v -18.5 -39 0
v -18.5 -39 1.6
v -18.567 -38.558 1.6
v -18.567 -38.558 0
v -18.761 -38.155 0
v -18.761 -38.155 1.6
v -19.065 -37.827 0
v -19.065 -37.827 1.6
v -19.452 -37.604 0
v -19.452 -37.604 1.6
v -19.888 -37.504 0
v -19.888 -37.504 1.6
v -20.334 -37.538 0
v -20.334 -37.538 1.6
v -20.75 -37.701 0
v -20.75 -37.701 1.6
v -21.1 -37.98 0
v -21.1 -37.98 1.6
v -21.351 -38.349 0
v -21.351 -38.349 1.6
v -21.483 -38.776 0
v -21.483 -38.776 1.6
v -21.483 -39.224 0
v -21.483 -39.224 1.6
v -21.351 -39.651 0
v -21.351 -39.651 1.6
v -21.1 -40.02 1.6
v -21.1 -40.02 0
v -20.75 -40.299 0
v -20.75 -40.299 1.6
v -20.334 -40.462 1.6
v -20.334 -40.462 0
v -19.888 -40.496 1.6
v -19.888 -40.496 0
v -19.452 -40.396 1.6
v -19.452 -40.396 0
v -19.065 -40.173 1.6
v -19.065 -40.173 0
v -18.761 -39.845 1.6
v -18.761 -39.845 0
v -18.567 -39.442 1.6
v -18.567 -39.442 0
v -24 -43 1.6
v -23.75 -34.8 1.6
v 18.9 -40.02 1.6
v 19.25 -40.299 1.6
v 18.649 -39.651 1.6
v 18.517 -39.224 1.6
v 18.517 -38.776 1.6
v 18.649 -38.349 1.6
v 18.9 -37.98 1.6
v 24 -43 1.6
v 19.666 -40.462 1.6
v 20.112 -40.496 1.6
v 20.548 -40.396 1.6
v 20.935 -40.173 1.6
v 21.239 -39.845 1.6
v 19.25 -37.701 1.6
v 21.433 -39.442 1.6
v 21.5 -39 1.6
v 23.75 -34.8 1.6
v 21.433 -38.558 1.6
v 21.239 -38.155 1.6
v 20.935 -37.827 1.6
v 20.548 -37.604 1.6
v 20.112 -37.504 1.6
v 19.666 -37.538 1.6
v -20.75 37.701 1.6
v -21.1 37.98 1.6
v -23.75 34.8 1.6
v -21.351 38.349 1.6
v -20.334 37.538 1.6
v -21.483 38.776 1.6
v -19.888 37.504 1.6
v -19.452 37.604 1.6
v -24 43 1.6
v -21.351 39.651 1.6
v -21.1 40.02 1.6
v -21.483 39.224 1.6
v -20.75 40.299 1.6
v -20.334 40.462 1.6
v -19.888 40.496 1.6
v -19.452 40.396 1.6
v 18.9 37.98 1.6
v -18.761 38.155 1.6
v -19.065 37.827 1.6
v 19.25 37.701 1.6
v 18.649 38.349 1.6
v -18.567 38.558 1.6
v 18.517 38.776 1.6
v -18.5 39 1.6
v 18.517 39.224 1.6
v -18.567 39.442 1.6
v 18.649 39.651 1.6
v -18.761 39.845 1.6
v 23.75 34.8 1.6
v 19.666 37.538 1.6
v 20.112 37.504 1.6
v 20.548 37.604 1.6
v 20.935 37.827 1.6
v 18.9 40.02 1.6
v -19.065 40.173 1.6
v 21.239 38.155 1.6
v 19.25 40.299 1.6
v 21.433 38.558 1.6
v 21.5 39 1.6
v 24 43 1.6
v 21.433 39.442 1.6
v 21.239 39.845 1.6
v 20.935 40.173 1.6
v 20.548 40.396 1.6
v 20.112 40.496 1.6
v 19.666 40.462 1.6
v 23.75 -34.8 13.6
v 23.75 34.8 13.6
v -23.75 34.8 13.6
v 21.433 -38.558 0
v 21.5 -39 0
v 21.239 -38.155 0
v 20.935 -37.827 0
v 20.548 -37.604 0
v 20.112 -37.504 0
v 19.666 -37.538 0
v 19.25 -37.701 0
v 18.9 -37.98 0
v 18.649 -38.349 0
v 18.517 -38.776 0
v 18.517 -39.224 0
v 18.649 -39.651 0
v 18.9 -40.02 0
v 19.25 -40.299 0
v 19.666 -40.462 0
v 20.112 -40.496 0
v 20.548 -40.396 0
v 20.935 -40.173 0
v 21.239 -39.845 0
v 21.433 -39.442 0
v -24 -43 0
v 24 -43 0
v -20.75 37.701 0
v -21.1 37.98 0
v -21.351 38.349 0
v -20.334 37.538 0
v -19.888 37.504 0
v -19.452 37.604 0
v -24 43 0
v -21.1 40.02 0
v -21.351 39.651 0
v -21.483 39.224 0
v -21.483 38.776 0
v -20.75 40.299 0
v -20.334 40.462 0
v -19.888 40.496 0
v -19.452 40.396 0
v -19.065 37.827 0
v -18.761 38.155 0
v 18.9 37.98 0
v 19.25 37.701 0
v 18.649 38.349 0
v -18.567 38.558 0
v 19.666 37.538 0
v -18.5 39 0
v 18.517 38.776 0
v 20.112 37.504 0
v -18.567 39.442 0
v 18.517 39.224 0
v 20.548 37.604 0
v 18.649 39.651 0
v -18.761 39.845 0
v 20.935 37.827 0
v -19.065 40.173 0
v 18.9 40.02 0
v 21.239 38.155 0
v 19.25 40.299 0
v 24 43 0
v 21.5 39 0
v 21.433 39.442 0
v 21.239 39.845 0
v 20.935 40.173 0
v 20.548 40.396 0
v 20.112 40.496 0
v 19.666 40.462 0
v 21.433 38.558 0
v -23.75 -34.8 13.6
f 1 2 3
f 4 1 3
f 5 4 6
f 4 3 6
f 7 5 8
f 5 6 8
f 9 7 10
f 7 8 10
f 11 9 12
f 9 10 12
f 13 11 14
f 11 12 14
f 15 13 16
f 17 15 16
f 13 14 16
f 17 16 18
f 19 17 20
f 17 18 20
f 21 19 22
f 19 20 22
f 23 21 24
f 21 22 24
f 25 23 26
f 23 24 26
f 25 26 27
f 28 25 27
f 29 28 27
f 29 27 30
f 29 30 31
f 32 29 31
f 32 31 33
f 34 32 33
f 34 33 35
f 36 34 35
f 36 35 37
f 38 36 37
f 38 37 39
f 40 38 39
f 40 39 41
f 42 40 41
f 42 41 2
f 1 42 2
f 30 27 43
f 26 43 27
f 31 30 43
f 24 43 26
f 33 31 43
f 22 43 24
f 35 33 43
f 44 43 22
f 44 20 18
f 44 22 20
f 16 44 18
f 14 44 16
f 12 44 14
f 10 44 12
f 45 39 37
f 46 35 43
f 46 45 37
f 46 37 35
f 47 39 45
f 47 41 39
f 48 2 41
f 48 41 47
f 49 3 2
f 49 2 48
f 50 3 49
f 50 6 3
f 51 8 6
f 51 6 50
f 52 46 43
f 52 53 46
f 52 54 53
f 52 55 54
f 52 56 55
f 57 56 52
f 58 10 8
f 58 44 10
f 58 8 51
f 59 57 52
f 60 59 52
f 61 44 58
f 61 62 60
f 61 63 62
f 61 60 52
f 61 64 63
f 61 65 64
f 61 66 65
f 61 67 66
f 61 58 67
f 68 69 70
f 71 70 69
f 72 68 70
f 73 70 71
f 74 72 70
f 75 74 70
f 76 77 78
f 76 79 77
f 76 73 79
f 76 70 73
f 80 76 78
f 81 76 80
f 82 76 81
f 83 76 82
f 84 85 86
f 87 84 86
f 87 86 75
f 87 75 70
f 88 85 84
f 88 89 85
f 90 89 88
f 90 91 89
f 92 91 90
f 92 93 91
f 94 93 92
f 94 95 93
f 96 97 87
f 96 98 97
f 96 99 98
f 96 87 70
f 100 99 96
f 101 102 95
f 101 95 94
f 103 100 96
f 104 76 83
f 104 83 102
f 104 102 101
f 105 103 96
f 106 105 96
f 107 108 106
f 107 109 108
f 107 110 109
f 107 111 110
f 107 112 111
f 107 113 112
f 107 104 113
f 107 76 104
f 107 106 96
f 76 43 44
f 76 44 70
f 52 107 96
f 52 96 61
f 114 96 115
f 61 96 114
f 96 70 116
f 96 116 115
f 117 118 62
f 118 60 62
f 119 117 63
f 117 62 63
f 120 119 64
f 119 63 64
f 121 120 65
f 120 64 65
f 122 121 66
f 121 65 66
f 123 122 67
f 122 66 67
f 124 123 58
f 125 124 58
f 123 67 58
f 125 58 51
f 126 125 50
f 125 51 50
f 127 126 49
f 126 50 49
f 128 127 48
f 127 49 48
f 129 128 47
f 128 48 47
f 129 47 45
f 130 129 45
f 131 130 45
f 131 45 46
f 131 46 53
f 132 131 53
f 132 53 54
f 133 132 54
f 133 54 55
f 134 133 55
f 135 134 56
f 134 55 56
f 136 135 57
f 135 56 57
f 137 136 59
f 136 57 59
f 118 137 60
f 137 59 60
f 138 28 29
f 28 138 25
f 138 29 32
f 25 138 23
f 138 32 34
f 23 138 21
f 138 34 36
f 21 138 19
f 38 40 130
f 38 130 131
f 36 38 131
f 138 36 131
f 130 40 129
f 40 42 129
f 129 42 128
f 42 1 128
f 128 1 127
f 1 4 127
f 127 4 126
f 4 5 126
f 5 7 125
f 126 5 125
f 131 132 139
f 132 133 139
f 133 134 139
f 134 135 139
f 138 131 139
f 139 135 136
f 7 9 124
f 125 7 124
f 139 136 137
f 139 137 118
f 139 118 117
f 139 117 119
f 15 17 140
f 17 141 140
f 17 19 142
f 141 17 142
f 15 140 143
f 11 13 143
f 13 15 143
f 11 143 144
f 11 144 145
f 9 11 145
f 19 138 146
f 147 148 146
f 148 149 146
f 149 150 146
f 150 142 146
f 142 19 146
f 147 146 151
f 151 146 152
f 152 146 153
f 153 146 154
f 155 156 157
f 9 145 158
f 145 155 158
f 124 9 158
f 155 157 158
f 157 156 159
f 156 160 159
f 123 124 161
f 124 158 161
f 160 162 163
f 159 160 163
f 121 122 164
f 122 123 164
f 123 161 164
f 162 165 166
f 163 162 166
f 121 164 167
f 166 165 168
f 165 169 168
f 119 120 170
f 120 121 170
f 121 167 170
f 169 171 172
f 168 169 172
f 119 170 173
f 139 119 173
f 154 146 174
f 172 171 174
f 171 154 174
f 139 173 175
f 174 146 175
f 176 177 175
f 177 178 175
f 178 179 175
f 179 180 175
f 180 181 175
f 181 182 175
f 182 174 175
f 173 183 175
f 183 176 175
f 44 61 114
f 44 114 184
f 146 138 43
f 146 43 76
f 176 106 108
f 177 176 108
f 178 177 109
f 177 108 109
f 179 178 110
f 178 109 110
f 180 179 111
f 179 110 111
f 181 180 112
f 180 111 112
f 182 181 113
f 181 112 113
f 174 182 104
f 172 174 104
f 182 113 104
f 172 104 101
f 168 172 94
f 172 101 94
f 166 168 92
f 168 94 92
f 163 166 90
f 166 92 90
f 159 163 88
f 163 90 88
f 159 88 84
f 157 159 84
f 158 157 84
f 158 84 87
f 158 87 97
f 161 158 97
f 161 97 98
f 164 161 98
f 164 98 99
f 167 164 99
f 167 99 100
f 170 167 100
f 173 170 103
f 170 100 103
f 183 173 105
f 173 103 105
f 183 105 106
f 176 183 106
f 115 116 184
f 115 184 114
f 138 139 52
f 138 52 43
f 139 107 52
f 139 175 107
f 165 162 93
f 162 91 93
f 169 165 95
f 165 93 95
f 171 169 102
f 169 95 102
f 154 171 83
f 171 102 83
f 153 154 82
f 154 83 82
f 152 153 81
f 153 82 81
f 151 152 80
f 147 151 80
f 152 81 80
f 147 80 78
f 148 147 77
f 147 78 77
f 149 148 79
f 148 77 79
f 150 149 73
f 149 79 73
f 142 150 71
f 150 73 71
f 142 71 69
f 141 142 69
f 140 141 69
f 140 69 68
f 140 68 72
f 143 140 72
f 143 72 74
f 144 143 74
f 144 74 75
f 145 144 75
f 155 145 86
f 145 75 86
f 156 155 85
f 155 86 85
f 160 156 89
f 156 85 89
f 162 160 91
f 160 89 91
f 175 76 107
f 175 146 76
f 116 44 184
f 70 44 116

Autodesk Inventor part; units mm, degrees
ref_plane "YZ Plane" through (0, 0, 0) normal (1, 0, 0) x (0, 1, 0)
ref_plane "XZ Plane" through (0, 0, 0) normal (0, 1, 0) x (-1, 0, 0)
ref_plane "XY Plane" through (0, 0, 0) normal (0, 0, 1) x (1, 0, 0)
sketch "スケッチ1" plane through (0, 0, 0) normal (0, 0, 1) x (1, 0, 0)
  line L0 (-24, 43) -> (24, 43)
  line L1 (24, 43) -> (24, -43)
  line L2 (24, -43) -> (-24, -43)
  line L3 (-24, -43) -> (-24, 43)
  point P0 (0, 0)
  point P1 (0, 43)
  point P2 (24, 0)
  dimension "d0" = 48
  dimension "d1" = 86
extrude "押し出し1" add sketch "スケッチ1" along normal blind 1.6
sketch "スケッチ2" plane through (0, 0, 1.6) normal (0, 0, 1) x (1, 0, 0)
  line L0 (-23.75, 34.8) -> (23.75, 34.8)
  line L1 (23.75, 34.8) -> (23.75, -34.8)
  line L2 (23.75, -34.8) -> (-23.75, -34.8)
  line L3 (-23.75, -34.8) -> (-23.75, 34.8)
  point P0 (0, 0)
  point P1 (0, 34.8)
  point P2 (23.75, 0)
  dimension "d4" = 47.5
  dimension "d5" = 69.6
extrude "押し出し2" add sketch "スケッチ2" along normal blind 12
sketch "スケッチ3" plane through (0, 0, 1.6) normal (0, 0, 1) x (1, 0, 0)
  line L0 (-24, -43) -> (24, -43) projected
  line L1 (-24, 43) -> (-24, -43) projected
  line L2 (24, -43) -> (24, 43) projected
  line L3 (24, 43) -> (-24, 43) projected
  circle A0 centre (-20, -39) radius 1.5
  circle A1 centre (20, -39) radius 1.5
  circle A2 centre (-20, 39) radius 1.5
  circle A3 centre (20, 39) radius 1.5
  point P0 (0, 0)
  dimension "d8" = 4
  dimension "d9" = 4
  dimension "d10" = 4
  dimension "d11" = 4
  dimension "d12" = 3
extrude "押し出し3" cut sketch "スケッチ3" against normal blind 1.6 contours A0 | A1 | A2 | A3
sketch "スケッチ4" plane through (0, 0, 13.6) normal (0, 0, 1) x (1, 0, 0)
  line L0 (-19.4086, 28.472) -> (45.9399, 28.472) construction
  line L1 (45.9399, 28.472) -> (45.9399, -30.0693) construction
  line L2 (45.9399, -30.0693) -> (-19.4086, -30.0693) construction
  line L3 (-19.4086, -30.0693) -> (-19.4086, 28.472) construction
  point P0 (0, 0)
properties part number "Big7seg"
